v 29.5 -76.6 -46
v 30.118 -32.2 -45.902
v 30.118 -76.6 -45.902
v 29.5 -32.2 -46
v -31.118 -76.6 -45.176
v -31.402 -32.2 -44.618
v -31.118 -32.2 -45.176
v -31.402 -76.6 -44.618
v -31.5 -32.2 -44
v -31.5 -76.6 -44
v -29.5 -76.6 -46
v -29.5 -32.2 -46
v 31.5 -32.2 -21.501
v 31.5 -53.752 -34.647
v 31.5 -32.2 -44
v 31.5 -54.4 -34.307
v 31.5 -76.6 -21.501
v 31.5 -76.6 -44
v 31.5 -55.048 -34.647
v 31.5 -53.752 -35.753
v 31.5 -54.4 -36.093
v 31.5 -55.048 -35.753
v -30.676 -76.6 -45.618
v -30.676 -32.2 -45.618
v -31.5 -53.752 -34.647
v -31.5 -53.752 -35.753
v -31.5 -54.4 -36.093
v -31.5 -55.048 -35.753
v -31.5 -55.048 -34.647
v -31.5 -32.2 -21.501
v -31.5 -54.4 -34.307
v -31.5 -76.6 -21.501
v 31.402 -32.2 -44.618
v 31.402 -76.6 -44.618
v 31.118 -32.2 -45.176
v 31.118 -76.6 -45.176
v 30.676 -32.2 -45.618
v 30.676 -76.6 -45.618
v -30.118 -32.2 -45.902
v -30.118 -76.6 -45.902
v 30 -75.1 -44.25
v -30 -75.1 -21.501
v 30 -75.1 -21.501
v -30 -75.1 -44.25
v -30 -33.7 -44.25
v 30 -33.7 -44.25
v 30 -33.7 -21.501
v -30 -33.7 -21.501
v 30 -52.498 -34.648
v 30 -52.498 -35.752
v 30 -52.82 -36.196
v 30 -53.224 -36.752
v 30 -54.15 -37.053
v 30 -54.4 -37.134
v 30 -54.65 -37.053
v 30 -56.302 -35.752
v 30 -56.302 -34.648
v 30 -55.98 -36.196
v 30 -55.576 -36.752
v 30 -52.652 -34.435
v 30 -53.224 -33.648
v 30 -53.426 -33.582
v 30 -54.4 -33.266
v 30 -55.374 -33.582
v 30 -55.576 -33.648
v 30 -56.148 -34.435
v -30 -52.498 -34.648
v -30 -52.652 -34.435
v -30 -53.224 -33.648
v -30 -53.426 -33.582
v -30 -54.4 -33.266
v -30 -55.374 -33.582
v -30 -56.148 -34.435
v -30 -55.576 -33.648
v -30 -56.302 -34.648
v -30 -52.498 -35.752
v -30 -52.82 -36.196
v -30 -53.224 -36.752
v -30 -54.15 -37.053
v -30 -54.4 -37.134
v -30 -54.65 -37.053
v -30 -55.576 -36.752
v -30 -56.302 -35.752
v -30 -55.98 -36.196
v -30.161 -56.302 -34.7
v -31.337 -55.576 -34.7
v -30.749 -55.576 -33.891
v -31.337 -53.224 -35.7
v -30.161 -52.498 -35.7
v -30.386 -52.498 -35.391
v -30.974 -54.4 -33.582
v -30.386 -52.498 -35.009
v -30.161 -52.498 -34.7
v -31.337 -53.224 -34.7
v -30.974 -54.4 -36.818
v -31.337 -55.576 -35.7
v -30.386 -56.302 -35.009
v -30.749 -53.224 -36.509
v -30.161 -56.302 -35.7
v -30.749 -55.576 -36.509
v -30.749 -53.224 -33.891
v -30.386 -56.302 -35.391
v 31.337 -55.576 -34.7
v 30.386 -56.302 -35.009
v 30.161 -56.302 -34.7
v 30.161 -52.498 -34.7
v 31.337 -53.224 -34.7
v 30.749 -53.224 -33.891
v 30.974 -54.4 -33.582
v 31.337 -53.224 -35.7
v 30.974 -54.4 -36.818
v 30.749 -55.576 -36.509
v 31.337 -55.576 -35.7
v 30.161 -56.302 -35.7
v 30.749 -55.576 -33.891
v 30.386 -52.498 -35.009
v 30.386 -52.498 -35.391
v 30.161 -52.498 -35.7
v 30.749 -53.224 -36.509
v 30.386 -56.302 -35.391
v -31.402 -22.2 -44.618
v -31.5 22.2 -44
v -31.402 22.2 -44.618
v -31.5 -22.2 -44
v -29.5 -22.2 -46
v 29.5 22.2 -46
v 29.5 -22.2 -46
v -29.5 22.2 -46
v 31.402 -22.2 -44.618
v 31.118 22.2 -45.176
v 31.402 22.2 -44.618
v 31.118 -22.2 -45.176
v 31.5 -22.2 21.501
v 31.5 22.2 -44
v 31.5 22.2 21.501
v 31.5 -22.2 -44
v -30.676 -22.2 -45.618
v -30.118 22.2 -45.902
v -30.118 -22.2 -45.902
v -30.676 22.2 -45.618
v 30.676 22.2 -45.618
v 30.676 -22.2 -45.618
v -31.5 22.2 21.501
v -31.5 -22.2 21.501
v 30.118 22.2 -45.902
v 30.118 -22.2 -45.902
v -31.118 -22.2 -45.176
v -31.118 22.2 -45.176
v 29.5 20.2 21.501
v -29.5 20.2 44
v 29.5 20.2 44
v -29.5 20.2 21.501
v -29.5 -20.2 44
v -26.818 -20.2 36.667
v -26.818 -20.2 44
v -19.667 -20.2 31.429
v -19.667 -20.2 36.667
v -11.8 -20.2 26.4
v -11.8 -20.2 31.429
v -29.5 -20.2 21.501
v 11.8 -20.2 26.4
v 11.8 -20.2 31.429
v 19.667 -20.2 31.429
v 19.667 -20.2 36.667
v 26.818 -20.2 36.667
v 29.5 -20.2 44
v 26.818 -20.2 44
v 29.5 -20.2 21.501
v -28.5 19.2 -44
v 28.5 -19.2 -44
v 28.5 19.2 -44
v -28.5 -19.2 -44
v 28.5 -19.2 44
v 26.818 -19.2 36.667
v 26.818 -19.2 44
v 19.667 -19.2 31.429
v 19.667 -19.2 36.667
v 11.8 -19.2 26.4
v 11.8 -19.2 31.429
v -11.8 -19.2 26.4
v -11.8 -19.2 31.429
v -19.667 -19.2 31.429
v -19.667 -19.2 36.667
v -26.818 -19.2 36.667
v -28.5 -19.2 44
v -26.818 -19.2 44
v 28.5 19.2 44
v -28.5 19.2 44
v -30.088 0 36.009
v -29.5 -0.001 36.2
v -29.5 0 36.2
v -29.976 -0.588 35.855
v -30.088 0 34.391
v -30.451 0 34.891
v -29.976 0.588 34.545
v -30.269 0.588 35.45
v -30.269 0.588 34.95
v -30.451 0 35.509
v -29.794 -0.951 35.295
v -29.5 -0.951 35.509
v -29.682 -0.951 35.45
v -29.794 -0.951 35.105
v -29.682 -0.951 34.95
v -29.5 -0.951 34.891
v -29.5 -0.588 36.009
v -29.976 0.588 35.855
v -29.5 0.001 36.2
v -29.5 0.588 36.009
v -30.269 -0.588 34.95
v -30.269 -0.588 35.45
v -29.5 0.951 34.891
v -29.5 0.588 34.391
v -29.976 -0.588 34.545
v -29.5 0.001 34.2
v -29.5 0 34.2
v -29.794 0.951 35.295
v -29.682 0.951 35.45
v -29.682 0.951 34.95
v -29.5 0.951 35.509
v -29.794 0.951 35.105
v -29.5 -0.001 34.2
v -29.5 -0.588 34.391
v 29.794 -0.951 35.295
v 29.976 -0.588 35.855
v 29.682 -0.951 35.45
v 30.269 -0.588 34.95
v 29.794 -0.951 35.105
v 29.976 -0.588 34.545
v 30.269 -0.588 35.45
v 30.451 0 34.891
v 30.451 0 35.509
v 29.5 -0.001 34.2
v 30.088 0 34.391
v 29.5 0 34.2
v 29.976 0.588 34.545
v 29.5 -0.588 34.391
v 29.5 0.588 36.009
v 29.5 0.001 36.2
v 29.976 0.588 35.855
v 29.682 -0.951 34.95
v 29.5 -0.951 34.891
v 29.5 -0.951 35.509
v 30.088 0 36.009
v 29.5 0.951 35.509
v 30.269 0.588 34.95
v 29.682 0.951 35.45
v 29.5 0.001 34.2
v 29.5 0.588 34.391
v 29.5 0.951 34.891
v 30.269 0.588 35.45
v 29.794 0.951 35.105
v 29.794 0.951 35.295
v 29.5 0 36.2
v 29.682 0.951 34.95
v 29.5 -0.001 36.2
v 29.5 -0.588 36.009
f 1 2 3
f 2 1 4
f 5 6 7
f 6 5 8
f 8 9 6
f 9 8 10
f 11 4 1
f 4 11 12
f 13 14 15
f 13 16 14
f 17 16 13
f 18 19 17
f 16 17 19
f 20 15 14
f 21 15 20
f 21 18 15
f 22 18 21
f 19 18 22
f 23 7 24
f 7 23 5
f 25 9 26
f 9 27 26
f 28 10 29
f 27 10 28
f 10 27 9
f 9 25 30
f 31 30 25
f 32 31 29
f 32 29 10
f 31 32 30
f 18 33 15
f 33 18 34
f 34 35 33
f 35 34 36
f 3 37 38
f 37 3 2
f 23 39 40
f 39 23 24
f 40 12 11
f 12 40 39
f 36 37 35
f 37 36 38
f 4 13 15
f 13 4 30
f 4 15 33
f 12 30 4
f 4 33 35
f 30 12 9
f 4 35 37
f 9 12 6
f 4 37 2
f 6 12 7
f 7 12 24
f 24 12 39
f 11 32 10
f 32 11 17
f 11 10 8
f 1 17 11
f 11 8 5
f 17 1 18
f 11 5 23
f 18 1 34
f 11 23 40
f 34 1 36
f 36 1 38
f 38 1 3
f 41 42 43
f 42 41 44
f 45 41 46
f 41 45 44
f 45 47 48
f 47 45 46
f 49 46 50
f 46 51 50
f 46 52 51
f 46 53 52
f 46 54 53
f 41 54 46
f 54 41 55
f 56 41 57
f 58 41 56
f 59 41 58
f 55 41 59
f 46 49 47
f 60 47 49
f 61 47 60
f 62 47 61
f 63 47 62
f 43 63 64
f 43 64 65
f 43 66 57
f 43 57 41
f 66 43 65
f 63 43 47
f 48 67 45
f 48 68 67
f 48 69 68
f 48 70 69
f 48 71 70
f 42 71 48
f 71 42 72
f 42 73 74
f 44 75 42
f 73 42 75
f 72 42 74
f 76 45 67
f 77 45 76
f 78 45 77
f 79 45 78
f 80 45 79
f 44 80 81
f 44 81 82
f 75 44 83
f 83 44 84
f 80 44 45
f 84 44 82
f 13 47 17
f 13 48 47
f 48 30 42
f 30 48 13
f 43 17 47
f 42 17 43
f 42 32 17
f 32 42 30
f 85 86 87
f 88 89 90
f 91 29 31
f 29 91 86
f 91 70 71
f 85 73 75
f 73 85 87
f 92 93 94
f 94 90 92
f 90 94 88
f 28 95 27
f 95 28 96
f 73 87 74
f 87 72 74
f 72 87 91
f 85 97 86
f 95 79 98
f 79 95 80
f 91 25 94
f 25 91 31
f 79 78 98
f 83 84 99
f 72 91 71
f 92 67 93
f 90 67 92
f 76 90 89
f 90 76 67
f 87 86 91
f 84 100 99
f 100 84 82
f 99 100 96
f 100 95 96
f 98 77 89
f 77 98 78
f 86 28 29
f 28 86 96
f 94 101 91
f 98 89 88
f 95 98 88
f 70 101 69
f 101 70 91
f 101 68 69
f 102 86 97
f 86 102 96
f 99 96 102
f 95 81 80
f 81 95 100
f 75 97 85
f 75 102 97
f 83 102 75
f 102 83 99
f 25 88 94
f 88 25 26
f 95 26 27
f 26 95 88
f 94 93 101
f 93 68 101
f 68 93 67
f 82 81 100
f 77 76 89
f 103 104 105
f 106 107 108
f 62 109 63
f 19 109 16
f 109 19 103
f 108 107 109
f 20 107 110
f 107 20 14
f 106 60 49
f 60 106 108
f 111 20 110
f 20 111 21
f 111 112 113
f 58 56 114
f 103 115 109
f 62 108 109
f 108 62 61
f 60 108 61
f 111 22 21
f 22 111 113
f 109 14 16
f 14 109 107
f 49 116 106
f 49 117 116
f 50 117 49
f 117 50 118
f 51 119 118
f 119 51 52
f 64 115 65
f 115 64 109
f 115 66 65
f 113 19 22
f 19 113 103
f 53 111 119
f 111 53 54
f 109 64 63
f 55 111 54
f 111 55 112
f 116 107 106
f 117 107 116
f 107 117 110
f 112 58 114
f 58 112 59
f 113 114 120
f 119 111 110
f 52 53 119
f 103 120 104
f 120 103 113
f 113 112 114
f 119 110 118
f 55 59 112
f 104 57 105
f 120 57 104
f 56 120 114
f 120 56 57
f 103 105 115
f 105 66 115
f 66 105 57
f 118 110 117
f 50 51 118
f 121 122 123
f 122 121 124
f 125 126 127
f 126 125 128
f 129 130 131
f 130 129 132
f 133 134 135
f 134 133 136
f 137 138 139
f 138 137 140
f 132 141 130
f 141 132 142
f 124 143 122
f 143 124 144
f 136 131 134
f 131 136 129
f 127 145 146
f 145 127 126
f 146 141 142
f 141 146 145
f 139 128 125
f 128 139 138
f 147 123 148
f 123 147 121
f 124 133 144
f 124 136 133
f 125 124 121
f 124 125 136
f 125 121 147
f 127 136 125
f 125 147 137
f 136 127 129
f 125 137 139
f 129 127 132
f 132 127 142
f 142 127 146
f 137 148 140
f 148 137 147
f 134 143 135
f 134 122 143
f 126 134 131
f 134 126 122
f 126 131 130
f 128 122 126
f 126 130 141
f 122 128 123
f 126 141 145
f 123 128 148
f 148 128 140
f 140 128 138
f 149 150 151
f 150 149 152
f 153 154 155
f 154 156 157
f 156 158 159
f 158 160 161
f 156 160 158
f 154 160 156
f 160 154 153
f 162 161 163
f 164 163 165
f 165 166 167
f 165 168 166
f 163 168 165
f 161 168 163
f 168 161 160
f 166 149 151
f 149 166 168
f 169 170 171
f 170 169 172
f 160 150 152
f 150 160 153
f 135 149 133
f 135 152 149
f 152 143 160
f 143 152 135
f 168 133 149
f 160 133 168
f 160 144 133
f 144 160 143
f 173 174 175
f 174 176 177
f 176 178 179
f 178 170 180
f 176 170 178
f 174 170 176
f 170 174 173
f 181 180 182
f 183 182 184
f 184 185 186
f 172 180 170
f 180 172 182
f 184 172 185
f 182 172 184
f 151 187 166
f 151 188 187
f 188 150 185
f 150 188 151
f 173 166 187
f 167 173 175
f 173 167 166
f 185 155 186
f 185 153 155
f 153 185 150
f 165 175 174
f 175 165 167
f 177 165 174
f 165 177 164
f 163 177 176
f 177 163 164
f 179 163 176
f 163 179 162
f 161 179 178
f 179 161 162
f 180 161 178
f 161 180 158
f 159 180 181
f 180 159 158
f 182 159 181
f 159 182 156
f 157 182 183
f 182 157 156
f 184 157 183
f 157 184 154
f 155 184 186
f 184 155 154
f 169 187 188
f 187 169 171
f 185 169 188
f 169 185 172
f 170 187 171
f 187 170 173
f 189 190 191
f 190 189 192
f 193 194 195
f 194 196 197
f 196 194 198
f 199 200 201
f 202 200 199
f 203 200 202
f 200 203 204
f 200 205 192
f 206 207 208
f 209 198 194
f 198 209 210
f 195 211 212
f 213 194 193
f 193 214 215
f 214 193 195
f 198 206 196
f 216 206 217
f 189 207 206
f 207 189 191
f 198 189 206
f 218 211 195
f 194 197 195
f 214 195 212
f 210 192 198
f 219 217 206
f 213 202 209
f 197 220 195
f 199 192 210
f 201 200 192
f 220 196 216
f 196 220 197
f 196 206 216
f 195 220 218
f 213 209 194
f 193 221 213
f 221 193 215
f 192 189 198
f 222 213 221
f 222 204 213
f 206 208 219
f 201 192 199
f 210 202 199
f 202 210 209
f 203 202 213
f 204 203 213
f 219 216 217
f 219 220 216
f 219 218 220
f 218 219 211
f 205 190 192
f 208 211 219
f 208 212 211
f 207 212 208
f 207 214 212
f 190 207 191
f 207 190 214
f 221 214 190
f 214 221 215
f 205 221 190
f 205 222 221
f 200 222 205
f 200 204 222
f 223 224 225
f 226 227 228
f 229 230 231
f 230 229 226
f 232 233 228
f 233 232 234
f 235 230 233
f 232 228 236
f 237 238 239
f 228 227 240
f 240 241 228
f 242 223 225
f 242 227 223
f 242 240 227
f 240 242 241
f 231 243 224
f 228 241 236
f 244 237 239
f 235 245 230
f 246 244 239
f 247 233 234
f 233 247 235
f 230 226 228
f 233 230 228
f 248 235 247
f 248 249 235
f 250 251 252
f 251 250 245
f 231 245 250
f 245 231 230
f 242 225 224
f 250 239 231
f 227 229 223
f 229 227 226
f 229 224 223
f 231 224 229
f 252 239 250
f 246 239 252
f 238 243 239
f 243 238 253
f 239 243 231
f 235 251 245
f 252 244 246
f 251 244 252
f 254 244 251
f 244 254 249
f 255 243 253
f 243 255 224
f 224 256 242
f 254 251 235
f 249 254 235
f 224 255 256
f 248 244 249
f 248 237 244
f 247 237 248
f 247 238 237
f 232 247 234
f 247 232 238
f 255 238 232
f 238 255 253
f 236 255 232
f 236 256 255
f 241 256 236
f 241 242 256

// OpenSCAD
/* [Global] */

/* [Card] */
//How many cards would you like to hold?
card_number = 32;
//How long is your card?
card_length = 88;
//How wide is your card?
card_width = 57;
//How thick is your card?
card_thickness = 1;

/* [Box] */
wall_thickness = 2; //[2:1:10]
corner_style = "Rounded"; //[Rounded,Angled,None]

/* [Logo] */
logo_style = "None"; //[MakerBot Logo,Heart,Star,Draw Your Own,None]
logo_size = 20; //[1:1:50]
logo_depth = .1; //[.1:.1:1]

/* [Star] */
//This will only affect the "Star" logo style.
star_border_thickness = 15; //[0:1:50]

/* [Draw] */
//Draw your own logo using the canvas below. WARNING: This feature is experimental, and may be a big buggy!
draw_a_logo =  [[[-30.607849,-48.473831],[-38.714745,-48.950043],[-40.559818,-48.486679],[-42.201851,-47.493645],[-47.306175,-42.282654],[-50.067959,-38.508476],[-47.496841,-39.749046],[-46.892071,-39.806171],[-46.653542,-39.556297],[-49.260830,-36.213120],[-49.681732,-34.902710],[-49.585598,-33.782043],[-49.138451,-33.165283],[-48.672112,-33.207165],[-46.200596,-35.658916],[-47.279457,-33.120216],[-47.321926,-32.230251],[-46.990898,-31.375122],[-45.878410,-30.094749],[-43.224831,-28.013985],[-42.217957,-27.615326],[-41.118553,-27.667067],[-40.805717,-27.398746],[-40.440659,-25.661360],[-39.173859,-13.378041],[-37.786060,-6.545761],[-36.585690,-3.203835],[-34.921036,-0.177278],[-32.697136,2.334522],[-31.352158,3.341671],[-28.276741,4.879042],[-24.862782,5.878342],[-21.320715,6.457005],[-16.227745,6.793123],[-6.193724,6.651176],[-3.917368,6.182596],[1.149520,4.628635],[3.496422,4.354591],[5.367534,4.861082],[8.187830,6.665401],[10.588829,7.390333],[11.411912,7.954811],[11.835903,9.095350],[12.399237,12.947439],[13.889902,16.162262],[13.933737,17.683546],[13.316607,19.065596],[11.898010,21.208532],[6.859921,27.302176],[5.617778,29.462534],[5.115950,31.361303],[3.388903,42.964180],[3.273381,46.066513],[3.726890,48.114418],[4.978456,49.315399],[7.242655,49.967201],[8.609360,50.079552],[9.707384,49.859634],[11.739238,48.611275],[14.175842,46.044868],[16.663437,42.226387],[17.125431,47.022690],[17.457367,48.010414],[17.989151,48.348061],[19.181324,47.905319],[24.528868,44.299988],[25.586594,43.349907],[26.602041,41.795021],[27.508392,39.332878],[29.795576,26.542974],[30.282230,24.476656],[31.117352,22.414083],[31.720629,21.625368],[32.642006,21.057058],[35.131134,20.683912],[36.914520,20.059973],[39.043831,18.184668],[42.450657,14.071085],[46.617176,8.405781],[48.564854,5.175398],[49.817593,2.084951],[50.067959,0.425432],[49.656380,-0.983798],[48.150597,-2.837172],[45.817619,-4.786176],[42.303886,-6.914544],[36.506889,-8.046309],[35.342590,-8.523187],[34.626579,-9.248261],[34.336266,-10.490269],[34.565552,-12.031119],[35.052368,-13.404231],[37.089733,-17.042198],[37.317879,-18.115067],[37.155357,-19.071182],[35.604301,-21.320902],[33.913990,-23.043991],[33.883816,-28.314064],[33.082306,-30.108660],[31.550901,-32.176041],[30.204401,-33.504837],[26.342428,-35.397213],[25.570063,-36.226906],[25.784672,-37.377975],[26.657942,-38.691196],[35.016315,-47.244415],[36.307613,-48.865204],[36.517559,-49.673759],[35.642605,-50.079552],[30.526541,-50.070801],[27.432796,-49.786285],[24.770382,-49.194931],[21.059244,-47.649162],[13.547039,-43.090836],[12.276370,-42.541962],[10.688703,-42.258522],[3.786492,-43.914528],[2.470330,-44.603432],[2.196272,-45.124454],[2.270218,-46.117500],[3.513528,-49.225983],[3.376098,-49.617065],[2.794866,-49.836327],[-5.766325,-50.020004],[-18.879635,-49.768524],[-25.214447,-49.130280],[-29.151905,-47.714996],[-30.600498,-48.472359]],[[0,1,2,3,4,5,6,7,8,9,10,11,12,13,14,15,16,17,18,19,20,21,22,23,24,25,26,27,28,29,30,31,32,33,34,35,36,37,38,39,40,41,42,43,44,45,46,47,48,49,50,51,52,53,54,55,56,57,58,59,60,61,62,63,64,65,66,67,68,69,70,71,72,73,74,75,76,77,78,79,80,81,82,83,84,85,86,87,88,89,90,91,92,93,94,95,96,97,98,99,100,101,102,103,104,105,106,107,108,109,110,111,112,113,114,115,116,117,118,119,120,121,122,123,124,125,126,127]]]; //[draw_polygon:100x100]

/* [Hidden] */

//The thickness of the border around the inside of the box which locks into the top piece.
border_thickness = wall_thickness/2; //[1:1:5]


/* [Upload] */ //IF YOU PUT THIS BACK IN, REMEMBER TO ADD IT TO LOGO_STYLE
// Upload a 100x100 pixel image (images will be automatically stretched to fit). Simple, high contrast images like logos work best.
//upload_image = "testimage_invert.dat"; // [image_surface:100x100]

inner_length = ceil(card_length); //Card is 89.22mm
inner_width = ceil(card_width) + (border_thickness * 2); //Card is 51.10mm
inner_height = ((card_thickness * 1.2) * card_number) + (border_thickness * 2); //Card is .5mm
frontcut1_length = inner_length / 6;
frontcut1_width = inner_width / 1.1;
frontcut2_length = inner_length / 3.5;
frontcut2_width = inner_width / 1.5;
frontcut3_length = inner_length / 2.5;
frontcut3_width = inner_width / 2.5;
top_height = (inner_length + wall_thickness) / 4;
top_fit = 4;
logo_xy = logo_size * (inner_width / 26);
MBM_height = 60;
MBM_thickness = 1;
MBM_radius = MBM_height/5.5;
function lookup_rez(wall_thickness) = floor(lookup(wall_thickness,[[2,10],[10,20]]));
e = .001; //epsilon
es = .5;  //extra space for the top part

rotate([90,90,0]){
    TopFinal();
    BottomFinal();
}

/* Modules */

module TopFinal(){
    translate([0,0,(inner_height + (wall_thickness * 2)) + 10]){
        rotate([0,180,0]){
            difference(){
                TopLocked();
                translate([0,0,((inner_height/2) + wall_thickness + (wall_thickness/4)) - logo_depth + e]){
                    if(logo_style == "MakerBot Logo"){
                        MakerbotLogo();
                    }
                    if(logo_style == "Heart"){
                        HeartLogo();
                    }
                    if(logo_style == "Star"){
                        StarLogo();
                    }
                    if(logo_style == "Upload An Image"){
                        UploadedLogo();
                    }
                    if(logo_style == "Draw Your Own"){
                        DrawnLogo();
                    }
                }
            }
        }
    }
}
module BottomFinal(){
    difference(){
        BottomLocked();
        translate([0,0,((inner_height/2) + wall_thickness + (wall_thickness/4)) - logo_depth + e]){
            if(logo_style == "MakerBot Logo"){
                MakerbotLogo();
            }
            if(logo_style == "Heart"){
                HeartLogo();
            }
            if(logo_style == "Star"){
                StarLogo();
            }
            if(logo_style == "Upload An Image"){
                UploadedLogo();
            }
            if(logo_style == "Draw Your Own"){
                DrawnLogo();
            }
        }
    }
}
module HeartLogo(){
    resize([logo_xy,logo_xy,wall_thickness/2]){
        translate([1.5,0,0]){
            rotate([0,0,135]){
                linear_extrude(height = 1, center = true){
                    square([20,20], center = true);
                    translate([0, 10, 0]){
                        circle(r = 10);
                    }
                    translate([10, 0, 0]){
                        circle(r = 10);
                    }
                }
            }
        }
    }
}
module DrawnLogo(){
    scale([logo_xy/100,logo_xy/100,wall_thickness/2]){
        rotate([0,0,90]){
            linear_extrude(height = 1, center = true){
                polygon(points = draw_a_logo[0], paths = draw_a_logo[1], center = true);
            }
        }
    }
}
//module UploadedLogo(){
//    resize([logo_xy,logo_xy,wall_thickness/2]){
//        translate([0,0,-.25]){
//            difference(){
//                surface(file = upload_image, center = true);
//                translate([0,0,-.5]){
//                    cube([100,100,1],center = true);
//                }
//            }
//        }
//    }
//}
module StarLogo(){
    resize([logo_xy,logo_xy,wall_thickness/2]){
        difference(){
            cylinder($fn = 3, r = 50, h = 1, center = true);
            cylinder($fn = 3, r = 50 - star_border_thickness, h = 1, center = true);
        }
        rotate([0,0,180]){
            difference(){
                cylinder($fn = 3, r = 50, h = 1, center = true);
                cylinder($fn = 3, r = 50 - star_border_thickness, h = 1, center = true);
            }
        }
    }
}
module MakerbotLogo(){
	resize([logo_xy,logo_xy,wall_thickness/2]){
        rotate([0,0,90]){
            translate([-1.25*MBM_radius,1.5*MBM_radius,-MBM_thickness/2]){
                translate([0,MBM_radius * 0.2,]){
                    difference(){
                        cylinder(r=MBM_radius,h = MBM_thickness, $fn=20);
                        translate([0,-1*MBM_radius,0]){
                            cube([MBM_radius,MBM_radius,MBM_thickness]);
                        }
                    }
                }
                translate([2.5*MBM_radius,MBM_radius * 0.2,0]){
                    difference(){
                        cylinder(r=MBM_radius,h = MBM_thickness, $fn=20);
                        translate([-1*MBM_radius,-1*MBM_radius,0]){
                            cube([MBM_radius,MBM_radius,MBM_thickness]);
                        }
                    }
                }
                translate([-1*MBM_radius,0,0]){
                    translate([0,-3.5*MBM_radius,0]){
                        cube([MBM_radius,3.75*MBM_radius,MBM_thickness]);
                    }
                    translate([MBM_radius/2,-3.5*MBM_radius,0]){
                        cylinder(r=MBM_radius/2,h=MBM_thickness, $fn=20);
                    }
                }
                translate([0.75*MBM_radius,0,0]){
                    translate([0,-3.5*MBM_radius,0]){
                        cube([MBM_radius,3.75*MBM_radius,MBM_thickness]);
                    }
                    translate([MBM_radius/2,-3.5*MBM_radius,0]){
                        cylinder(r=MBM_radius/2,h=MBM_thickness, $fn=20);
                    }
                }
                translate([2.5*MBM_radius,0,0]){
                    translate([0,-3.5*MBM_radius,0]){
                        cube([MBM_radius,3.75*MBM_radius,MBM_thickness]);
                    }
                    translate([MBM_radius/2,-3.5*MBM_radius,0]){
                        cylinder(r=MBM_radius/2,h=MBM_thickness, $fn=20);
                    }
                }
                translate([0,MBM_radius * 0.2,0]){
                    cube([2.5*MBM_radius,MBM_radius,MBM_thickness]);
                }
            }
            difference(){
                cylinder(r = MBM_radius * 4.6, h = MBM_thickness, center = true, $fn = 80);
                cylinder(r = MBM_radius * 3.8, h = MBM_thickness + e, center = true, $fn = 80);
            }
        }
    }
}
module BottomLocked(){
    BottomRaw();
    translate([-inner_length/2.5,-inner_width/2,0]){
        difference(){
            sphere($fn = lookup_rez(wall_thickness), r = wall_thickness/2);
            translate([0,wall_thickness/2,0]){
                cube([wall_thickness + e,wall_thickness + e,wall_thickness + e], center = true);
            }
        }
    }
    translate([-inner_length/2.5,inner_width/2,0]){
        difference(){
            sphere($fn = lookup_rez(wall_thickness), r = wall_thickness/2);
            translate([0,-wall_thickness/2,0]){
                cube([wall_thickness + e,wall_thickness + e,wall_thickness + e], center = true);
            }
        }
    }
}
module TopLocked(){
    difference(){
        TopRaw();
        union(){
            translate([-inner_length/2.5,-inner_width/1.98,0]){
//                if((border_thickness - wall_thickness) >= 3){
//                    sphere($fn = 20, r = inner_height/8 - ((border_thickness - wall_thickness)/3));
//                } else {
//                    sphere($fn = 20, r = inner_height/8);
//                }
                sphere($fn = lookup_rez(wall_thickness), r = wall_thickness);
            }
            translate([-inner_length/2.5,inner_width/1.98,0]){
//                if((border_thickness - wall_thickness) >= 3){
//                    sphere($fn = 20, r = inner_height/8 - ((border_thickness - wall_thickness)/3));
//                } else {
//                    sphere($fn = 20, r = inner_height/8);
//                }
                sphere($fn = lookup_rez(wall_thickness), r = wall_thickness);
            }
        }
    }
}
module Border(){
    //Front secton, stepped
    translate([0,0,(inner_height/2) - (border_thickness/2)]){
        linear_extrude(height = border_thickness, center = true){
            difference(){
                square([inner_length,inner_width], center = true);
                translate([-inner_length/2,0,0]){
                    square([frontcut1_length,frontcut1_width], center = true);
                }
                translate([-inner_length/2,0,0]){
                    square([frontcut2_length,frontcut2_width], center = true);
                }
                translate([-inner_length/2,0,0]){
                    square([frontcut3_length,frontcut3_width], center = true);
                }
            }
        }
    }
    //Back section
    translate([0,0,-(inner_height/2) + (border_thickness/2)]){
        linear_extrude(height = border_thickness, center = true){
            square([inner_length,inner_width], center = true);
        }
    }
    //Left section
    translate([0,-(inner_width/2) + (border_thickness/2),0]){
        rotate([90,0,0]){
            linear_extrude(height = border_thickness, center = true){
                square([inner_length,inner_height], center = true);
            }
        }
    }
    //Right section
    translate([0,(inner_width/2) - (border_thickness/2),0]){
        rotate([90,0,0]){
            linear_extrude(height = border_thickness, center = true){
                square([inner_length,inner_height], center = true);
            }
        }
    }
}

module BottomRaw(){
    intersection(){
        difference(){
            linear_extrude(height = inner_height + (wall_thickness * 2), center = true){
                if(corner_style == "Rounded"){
                    offset($fn = 20, r = wall_thickness){
                        square([inner_length,inner_width], center = true);
                    }
                }
                if(corner_style == "Angled"){
                    offset($fn = 20, delta = wall_thickness, chamfer = true){
                        square([inner_length,inner_width], center = true);
                    }
                }
                if(corner_style == "None"){
                    offset($fn = 20, delta = wall_thickness){
                        square([inner_length,inner_width], center = true);
                    }
                }
            }
            InnerBoxFull();
        }
        translate([top_height,0,0]){
            cube([inner_length + (e * 2),inner_width + (wall_thickness * 2) + (e * 2),inner_height + (wall_thickness * 2) + (e * 2)], center = true);
        }
    }
    Border();
}
module TopRaw(){
    difference(){
        difference(){
            linear_extrude(height = inner_height + (wall_thickness * 2), center = true){
                if(corner_style == "Rounded"){
                    offset($fn = 20, r = wall_thickness){
                        square([inner_length,inner_width], center = true);
                    }
                }
                if(corner_style == "Angled"){
                    offset($fn = 20, delta = wall_thickness, chamfer = true){
                        square([inner_length,inner_width], center = true);
                    }
                }
                if(corner_style == "None"){
                    offset($fn = 20, delta = wall_thickness){
                        square([inner_length,inner_width], center = true);
                    }
                }
            }
            resize([inner_length + (wall_thickness / top_fit),inner_width + (wall_thickness / top_fit) + es, inner_height + (wall_thickness / top_fit) + es]){
                InnerBoxFull();
            }
        }
        translate([top_height,0,0]){
            cube([inner_length + (e * 2),inner_width + (wall_thickness * 2) + (e * 2),inner_height + (wall_thickness * 2) + (e * 2)], center = true);
        }
    }
}
module InnerBoxFull(){
    linear_extrude(height = inner_height, center = true){
        square([inner_length,inner_width], center = true);
    }
}
